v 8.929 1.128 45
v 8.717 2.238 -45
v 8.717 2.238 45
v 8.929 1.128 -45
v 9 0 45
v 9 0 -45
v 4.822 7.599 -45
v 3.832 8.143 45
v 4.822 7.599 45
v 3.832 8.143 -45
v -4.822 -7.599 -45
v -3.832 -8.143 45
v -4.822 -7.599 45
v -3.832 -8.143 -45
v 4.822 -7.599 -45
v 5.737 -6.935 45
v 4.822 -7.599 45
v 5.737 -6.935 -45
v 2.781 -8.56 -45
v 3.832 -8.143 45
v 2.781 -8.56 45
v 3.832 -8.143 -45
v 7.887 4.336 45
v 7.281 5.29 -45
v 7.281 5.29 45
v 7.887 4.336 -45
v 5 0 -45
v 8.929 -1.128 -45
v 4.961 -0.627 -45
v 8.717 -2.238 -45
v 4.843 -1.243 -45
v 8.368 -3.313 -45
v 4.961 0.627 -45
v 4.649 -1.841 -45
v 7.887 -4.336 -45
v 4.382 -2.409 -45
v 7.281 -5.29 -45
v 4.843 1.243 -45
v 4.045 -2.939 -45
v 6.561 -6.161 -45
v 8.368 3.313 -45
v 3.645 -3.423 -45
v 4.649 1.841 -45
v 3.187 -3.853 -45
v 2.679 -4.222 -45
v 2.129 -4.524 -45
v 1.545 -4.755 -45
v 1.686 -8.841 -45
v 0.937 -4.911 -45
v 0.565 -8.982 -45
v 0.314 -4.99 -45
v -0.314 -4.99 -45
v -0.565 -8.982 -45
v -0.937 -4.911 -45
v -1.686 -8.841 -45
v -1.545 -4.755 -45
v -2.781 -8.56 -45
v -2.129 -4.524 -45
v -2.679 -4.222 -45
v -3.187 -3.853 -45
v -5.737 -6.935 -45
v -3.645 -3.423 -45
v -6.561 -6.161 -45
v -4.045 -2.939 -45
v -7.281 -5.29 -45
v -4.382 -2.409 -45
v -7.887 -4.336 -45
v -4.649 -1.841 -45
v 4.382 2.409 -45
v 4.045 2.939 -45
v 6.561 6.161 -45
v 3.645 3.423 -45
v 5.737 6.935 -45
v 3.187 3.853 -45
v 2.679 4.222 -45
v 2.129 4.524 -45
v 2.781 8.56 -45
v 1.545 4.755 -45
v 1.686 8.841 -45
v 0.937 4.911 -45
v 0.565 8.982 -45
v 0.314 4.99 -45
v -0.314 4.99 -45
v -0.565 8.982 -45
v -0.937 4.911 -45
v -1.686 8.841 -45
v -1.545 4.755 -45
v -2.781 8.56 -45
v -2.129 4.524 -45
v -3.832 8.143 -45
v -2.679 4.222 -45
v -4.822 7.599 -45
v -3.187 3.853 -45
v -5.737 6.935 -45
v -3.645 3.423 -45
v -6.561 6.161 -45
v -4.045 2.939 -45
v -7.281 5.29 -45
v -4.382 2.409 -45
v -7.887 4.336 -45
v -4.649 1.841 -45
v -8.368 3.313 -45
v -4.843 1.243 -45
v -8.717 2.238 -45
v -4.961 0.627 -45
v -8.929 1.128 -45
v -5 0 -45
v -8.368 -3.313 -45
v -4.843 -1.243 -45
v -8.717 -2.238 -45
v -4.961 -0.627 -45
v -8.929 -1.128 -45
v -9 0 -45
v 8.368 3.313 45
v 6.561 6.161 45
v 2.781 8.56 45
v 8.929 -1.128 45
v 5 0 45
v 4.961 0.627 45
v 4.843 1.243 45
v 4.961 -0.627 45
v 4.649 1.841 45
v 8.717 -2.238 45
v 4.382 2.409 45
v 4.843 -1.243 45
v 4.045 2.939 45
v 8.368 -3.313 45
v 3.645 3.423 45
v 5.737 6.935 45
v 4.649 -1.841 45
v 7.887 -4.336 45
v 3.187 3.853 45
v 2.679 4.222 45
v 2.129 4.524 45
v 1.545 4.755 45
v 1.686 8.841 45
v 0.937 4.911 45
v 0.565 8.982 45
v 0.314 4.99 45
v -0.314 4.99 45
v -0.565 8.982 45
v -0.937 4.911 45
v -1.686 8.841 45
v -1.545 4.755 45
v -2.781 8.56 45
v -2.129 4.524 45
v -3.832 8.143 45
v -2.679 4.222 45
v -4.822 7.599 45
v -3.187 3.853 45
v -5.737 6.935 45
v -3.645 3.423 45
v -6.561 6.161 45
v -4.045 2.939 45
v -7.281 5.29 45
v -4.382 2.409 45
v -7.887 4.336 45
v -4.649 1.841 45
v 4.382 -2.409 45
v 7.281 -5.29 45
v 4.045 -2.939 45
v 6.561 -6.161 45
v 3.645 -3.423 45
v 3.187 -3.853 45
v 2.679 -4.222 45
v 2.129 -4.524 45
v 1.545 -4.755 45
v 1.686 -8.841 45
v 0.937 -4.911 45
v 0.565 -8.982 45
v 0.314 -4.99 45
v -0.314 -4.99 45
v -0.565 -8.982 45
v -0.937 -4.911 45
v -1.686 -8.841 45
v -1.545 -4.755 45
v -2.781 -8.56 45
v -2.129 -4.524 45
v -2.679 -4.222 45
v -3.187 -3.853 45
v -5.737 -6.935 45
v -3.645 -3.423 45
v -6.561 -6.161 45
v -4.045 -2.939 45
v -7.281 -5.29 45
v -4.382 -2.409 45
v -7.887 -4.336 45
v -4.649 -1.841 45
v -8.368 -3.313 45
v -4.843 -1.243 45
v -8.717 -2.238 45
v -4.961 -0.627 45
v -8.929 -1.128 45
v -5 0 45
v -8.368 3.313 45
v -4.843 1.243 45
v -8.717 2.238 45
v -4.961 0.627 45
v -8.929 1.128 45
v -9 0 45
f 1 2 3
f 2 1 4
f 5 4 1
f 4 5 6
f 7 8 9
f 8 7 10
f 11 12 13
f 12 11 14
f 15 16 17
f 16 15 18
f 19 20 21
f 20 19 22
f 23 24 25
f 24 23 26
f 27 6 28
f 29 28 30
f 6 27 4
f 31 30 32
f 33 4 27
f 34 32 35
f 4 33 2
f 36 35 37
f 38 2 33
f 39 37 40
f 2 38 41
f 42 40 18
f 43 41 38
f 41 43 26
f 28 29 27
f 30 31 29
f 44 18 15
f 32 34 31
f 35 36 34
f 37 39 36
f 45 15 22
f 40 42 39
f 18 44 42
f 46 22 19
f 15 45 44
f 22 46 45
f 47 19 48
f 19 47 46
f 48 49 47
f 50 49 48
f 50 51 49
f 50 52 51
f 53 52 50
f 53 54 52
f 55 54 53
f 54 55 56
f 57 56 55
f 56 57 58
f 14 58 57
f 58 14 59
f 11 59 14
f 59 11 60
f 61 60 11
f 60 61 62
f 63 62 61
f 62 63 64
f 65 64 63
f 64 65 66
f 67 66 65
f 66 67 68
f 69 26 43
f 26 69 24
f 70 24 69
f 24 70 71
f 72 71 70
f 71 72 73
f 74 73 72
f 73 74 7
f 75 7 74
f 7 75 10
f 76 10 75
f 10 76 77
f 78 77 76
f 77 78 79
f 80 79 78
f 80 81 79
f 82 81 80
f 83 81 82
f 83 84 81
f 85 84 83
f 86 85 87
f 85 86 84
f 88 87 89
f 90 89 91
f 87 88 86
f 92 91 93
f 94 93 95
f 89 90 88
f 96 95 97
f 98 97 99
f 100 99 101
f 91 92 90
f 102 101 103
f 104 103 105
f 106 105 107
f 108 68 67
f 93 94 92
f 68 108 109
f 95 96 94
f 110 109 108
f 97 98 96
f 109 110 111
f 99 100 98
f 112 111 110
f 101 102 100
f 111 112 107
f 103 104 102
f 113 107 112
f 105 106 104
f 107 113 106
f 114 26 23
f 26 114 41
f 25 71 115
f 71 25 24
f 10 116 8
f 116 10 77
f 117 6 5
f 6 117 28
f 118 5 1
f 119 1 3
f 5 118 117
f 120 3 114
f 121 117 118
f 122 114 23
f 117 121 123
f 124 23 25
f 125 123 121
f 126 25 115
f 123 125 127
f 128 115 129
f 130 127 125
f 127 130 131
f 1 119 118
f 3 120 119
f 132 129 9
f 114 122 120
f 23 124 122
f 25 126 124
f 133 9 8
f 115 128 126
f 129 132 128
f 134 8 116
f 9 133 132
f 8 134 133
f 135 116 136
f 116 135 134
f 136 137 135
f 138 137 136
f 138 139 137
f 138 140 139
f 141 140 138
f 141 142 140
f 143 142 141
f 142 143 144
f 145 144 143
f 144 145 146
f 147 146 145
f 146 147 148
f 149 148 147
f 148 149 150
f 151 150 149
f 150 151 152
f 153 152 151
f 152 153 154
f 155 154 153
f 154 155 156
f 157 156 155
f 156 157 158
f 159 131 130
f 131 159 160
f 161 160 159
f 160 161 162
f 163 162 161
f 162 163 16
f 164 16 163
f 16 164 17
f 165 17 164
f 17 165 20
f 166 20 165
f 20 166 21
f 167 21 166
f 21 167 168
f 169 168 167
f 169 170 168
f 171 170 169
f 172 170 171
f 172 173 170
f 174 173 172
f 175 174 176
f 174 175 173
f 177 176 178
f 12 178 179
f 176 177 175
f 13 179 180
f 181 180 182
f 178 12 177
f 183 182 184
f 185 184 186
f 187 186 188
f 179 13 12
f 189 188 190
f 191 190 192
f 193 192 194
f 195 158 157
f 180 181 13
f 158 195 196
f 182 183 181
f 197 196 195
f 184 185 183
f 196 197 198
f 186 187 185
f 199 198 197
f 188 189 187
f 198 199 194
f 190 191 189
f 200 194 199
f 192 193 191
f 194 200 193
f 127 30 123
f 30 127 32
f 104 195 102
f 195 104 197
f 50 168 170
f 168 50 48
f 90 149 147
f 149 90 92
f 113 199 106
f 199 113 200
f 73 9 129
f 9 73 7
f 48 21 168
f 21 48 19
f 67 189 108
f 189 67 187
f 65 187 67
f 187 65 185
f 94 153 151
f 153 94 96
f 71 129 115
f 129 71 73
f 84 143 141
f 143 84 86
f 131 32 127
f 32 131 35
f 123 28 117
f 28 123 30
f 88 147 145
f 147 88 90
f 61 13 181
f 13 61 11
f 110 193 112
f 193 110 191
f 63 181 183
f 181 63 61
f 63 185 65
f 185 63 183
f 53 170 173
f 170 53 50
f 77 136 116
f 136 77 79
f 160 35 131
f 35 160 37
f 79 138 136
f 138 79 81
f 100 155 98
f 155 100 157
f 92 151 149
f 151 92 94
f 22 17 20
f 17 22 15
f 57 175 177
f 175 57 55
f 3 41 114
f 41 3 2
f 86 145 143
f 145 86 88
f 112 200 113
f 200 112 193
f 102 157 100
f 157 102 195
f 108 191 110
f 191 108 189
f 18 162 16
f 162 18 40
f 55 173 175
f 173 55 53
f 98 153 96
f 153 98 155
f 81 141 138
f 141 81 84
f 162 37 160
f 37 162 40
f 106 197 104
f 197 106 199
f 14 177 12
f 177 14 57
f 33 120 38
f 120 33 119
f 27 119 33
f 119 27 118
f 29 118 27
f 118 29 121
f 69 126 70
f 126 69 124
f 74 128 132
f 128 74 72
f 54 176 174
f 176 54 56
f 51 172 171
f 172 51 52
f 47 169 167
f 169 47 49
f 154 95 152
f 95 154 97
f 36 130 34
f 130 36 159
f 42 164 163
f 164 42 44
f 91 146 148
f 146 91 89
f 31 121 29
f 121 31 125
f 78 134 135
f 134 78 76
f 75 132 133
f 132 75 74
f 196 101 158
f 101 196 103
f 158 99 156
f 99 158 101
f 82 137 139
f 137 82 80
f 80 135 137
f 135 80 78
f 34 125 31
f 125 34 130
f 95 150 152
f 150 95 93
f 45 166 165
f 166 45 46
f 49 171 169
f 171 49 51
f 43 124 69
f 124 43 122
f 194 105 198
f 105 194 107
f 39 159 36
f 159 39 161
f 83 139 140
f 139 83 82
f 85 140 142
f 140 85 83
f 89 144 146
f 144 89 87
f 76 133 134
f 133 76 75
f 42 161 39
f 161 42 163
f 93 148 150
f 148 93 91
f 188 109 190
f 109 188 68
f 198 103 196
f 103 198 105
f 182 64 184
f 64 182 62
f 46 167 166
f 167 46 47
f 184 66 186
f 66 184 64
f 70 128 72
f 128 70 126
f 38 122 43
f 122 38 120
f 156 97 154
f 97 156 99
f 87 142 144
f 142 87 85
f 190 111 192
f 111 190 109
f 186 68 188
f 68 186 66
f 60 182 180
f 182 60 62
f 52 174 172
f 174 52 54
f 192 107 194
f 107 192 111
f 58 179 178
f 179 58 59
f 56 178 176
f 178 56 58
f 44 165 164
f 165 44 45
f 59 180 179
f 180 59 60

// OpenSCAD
$fn = 50;


difference() {
	union() {
		translate(v = [0, 0, -45.0000000000]) {
			cylinder(h = 90, r = 9.0000000000);
		}
	}
	union() {
		translate(v = [0, 0, -100.0000000000]) {
			cylinder(h = 200, r = 5.0000000000);
		}
	}
}
